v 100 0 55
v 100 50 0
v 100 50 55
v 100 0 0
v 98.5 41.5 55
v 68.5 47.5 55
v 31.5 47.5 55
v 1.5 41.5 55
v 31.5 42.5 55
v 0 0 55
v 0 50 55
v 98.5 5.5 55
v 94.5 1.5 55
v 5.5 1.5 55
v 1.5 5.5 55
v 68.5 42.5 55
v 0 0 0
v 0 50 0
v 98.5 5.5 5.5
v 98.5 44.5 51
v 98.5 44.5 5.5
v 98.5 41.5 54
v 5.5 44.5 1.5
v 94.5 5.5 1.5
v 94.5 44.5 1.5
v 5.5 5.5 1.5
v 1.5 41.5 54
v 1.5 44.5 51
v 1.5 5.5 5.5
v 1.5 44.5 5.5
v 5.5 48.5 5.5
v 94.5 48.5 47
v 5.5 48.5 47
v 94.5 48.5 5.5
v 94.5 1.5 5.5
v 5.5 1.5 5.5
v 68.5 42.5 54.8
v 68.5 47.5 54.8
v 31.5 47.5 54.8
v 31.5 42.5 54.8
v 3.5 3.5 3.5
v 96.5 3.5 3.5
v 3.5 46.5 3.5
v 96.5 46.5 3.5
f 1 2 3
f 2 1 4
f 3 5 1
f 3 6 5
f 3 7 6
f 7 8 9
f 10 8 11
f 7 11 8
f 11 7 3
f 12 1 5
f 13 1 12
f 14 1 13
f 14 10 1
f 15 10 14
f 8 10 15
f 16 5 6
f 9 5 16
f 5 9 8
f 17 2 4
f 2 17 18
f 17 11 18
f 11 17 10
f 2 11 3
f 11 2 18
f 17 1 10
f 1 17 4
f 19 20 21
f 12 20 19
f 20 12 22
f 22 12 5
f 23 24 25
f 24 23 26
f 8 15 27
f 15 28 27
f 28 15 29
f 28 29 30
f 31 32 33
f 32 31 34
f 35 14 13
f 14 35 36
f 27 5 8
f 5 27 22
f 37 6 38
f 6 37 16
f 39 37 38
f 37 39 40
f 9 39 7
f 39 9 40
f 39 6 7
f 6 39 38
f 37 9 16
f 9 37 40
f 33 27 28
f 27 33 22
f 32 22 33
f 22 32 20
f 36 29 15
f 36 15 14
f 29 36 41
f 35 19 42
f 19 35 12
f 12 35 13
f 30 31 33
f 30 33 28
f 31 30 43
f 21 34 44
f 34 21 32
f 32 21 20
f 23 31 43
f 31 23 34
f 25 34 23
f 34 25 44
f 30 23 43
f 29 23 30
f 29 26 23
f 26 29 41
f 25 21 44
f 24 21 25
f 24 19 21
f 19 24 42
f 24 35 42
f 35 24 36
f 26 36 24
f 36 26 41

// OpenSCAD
$fn=400;

box_sidewall_thickness=1.5;
box_ground_thickness=1.5;
box_outer_size_width=100;
box_outer_size_depth=50;
box_outer_height=55;
box_label_width=37;
box_label_height=5;
box_corner_support_size=4;

module corner_support(width, height) {
    
    label_frame=3;

    union() {

        // Create the support structure
        difference() {
            cube([width,height,height]);
            
            // Calculate the cube size for the difference by using the 
            // pythagorean theorem "Square root of a² and b²"
            tmp=sqrt((height)^2 + (height)^2);
            color("red") 
            rotate([45,0,0])
            translate([-1, 0, -tmp/2])
            cube([width+2, tmp/2, tmp]);   
        }
    }
}

module label(plate_width, plate_height, label_width, label_height, label_thickness, pos_x, pos_y, pos_z) {
    plate_thickness = 1;

    union() {
        difference() {
            // Draw a plate that is a bit larger than the label on each side
            color("blue")
            translate([pos_x, pos_y, pos_z])
            cube([plate_width, plate_height, plate_thickness]);
            // Draw a sink for the paper label
            color("green")
            translate([
                    pos_x + (plate_width - label_width)/2,
                    pos_y + (plate_height - label_height)/2,
                    pos_z + plate_thickness - label_thickness])
            cube([label_width, label_height, label_thickness+1]);
        }
        
        translate([pos_x,pos_y,pos_z - plate_height])
        corner_support(plate_width, plate_height);
    }
}

union() {
    // Create the box by differencing one cube with another one
    difference() {
        cube([box_outer_size_width, box_outer_size_depth, box_outer_height]);
        translate([box_sidewall_thickness, box_sidewall_thickness, box_ground_thickness])
        cube([box_outer_size_width - box_sidewall_thickness*2, box_outer_size_depth - box_sidewall_thickness*2,box_outer_height]);
    }

    // Add the label compoent
    label(
            box_outer_size_width - box_sidewall_thickness*2,                      // plate_width
            box_label_height+2,                                                   // plate_height (The paper label + 2mm). This will also be the height of the support structure. 
            box_label_width,                                                      // label_width
            box_label_height,                                                     // label_height
            0.2,                                                                  // label_thickness
            box_sidewall_thickness,                                               // pos_x
            box_outer_size_depth - box_label_height - 2 - box_sidewall_thickness, // pos_y
            box_outer_height - 1                                                  // pos_z
    );
    
    // Add the support structure in left bottom corner
    color("blue")
    translate([box_corner_support_size + box_sidewall_thickness,
                box_corner_support_size + box_sidewall_thickness,
                box_outer_height])
    rotate([180,90,0])
    corner_support(box_outer_height - box_ground_thickness,box_corner_support_size);
    
    // Add the support structure in right bottom corner
    color("blue")
    translate([box_outer_size_width - box_corner_support_size - box_sidewall_thickness,
                box_corner_support_size + box_sidewall_thickness,
                box_outer_height])
    rotate([90,90,0])
    corner_support(box_outer_height - box_ground_thickness,box_corner_support_size);
    
    // Add the support structure in left upper corner
    color("blue")
    translate([box_corner_support_size + box_sidewall_thickness,
                box_outer_size_depth - box_corner_support_size - box_sidewall_thickness,
                box_outer_height])
    rotate([270,90,0])
    corner_support(box_outer_height - box_ground_thickness,box_corner_support_size);
    
    // Add the support structure in right upper corner
    color("blue")
    translate([box_outer_size_width - box_corner_support_size - box_sidewall_thickness,
                box_outer_size_depth - box_corner_support_size - box_sidewall_thickness,
                box_outer_height])
    rotate([0,90,0])
    corner_support(box_outer_height - box_ground_thickness,box_corner_support_size);
    
    // Add the support structure at the ground (top)
    color("grey")
    translate([box_sidewall_thickness,
                box_outer_size_depth - box_corner_support_size - box_sidewall_thickness,
                box_corner_support_size + box_ground_thickness])
    mirror([0,0,1])
    corner_support(box_outer_size_width - box_sidewall_thickness*2,box_corner_support_size);
    
    // Add the support structure at the ground (left)
    color("grey")
    translate([box_corner_support_size + box_sidewall_thickness,
                0,
                box_corner_support_size + box_ground_thickness])
    rotate([0,0,90]) 
    mirror([0,0,1])
    corner_support(box_outer_size_depth - box_sidewall_thickness*2,box_corner_support_size);

    // Add the support structure at the ground (right)
    color("grey")
    translate([box_outer_size_width - box_corner_support_size - box_sidewall_thickness,
                + box_outer_size_depth,
                box_corner_support_size + box_ground_thickness])
    rotate([0,0,270]) 
    mirror([0,0,1])
    corner_support(box_outer_size_depth - box_sidewall_thickness*2,box_corner_support_size);

    // Add the support structure at the ground (bottom)
    color("grey")
    translate([box_outer_size_width,
                box_corner_support_size + box_sidewall_thickness,
                box_corner_support_size + box_ground_thickness])
    rotate([0,0,180]) 
    mirror([0,0,1])
    corner_support(box_outer_size_width - box_sidewall_thickness*2,box_corner_support_size);
}
